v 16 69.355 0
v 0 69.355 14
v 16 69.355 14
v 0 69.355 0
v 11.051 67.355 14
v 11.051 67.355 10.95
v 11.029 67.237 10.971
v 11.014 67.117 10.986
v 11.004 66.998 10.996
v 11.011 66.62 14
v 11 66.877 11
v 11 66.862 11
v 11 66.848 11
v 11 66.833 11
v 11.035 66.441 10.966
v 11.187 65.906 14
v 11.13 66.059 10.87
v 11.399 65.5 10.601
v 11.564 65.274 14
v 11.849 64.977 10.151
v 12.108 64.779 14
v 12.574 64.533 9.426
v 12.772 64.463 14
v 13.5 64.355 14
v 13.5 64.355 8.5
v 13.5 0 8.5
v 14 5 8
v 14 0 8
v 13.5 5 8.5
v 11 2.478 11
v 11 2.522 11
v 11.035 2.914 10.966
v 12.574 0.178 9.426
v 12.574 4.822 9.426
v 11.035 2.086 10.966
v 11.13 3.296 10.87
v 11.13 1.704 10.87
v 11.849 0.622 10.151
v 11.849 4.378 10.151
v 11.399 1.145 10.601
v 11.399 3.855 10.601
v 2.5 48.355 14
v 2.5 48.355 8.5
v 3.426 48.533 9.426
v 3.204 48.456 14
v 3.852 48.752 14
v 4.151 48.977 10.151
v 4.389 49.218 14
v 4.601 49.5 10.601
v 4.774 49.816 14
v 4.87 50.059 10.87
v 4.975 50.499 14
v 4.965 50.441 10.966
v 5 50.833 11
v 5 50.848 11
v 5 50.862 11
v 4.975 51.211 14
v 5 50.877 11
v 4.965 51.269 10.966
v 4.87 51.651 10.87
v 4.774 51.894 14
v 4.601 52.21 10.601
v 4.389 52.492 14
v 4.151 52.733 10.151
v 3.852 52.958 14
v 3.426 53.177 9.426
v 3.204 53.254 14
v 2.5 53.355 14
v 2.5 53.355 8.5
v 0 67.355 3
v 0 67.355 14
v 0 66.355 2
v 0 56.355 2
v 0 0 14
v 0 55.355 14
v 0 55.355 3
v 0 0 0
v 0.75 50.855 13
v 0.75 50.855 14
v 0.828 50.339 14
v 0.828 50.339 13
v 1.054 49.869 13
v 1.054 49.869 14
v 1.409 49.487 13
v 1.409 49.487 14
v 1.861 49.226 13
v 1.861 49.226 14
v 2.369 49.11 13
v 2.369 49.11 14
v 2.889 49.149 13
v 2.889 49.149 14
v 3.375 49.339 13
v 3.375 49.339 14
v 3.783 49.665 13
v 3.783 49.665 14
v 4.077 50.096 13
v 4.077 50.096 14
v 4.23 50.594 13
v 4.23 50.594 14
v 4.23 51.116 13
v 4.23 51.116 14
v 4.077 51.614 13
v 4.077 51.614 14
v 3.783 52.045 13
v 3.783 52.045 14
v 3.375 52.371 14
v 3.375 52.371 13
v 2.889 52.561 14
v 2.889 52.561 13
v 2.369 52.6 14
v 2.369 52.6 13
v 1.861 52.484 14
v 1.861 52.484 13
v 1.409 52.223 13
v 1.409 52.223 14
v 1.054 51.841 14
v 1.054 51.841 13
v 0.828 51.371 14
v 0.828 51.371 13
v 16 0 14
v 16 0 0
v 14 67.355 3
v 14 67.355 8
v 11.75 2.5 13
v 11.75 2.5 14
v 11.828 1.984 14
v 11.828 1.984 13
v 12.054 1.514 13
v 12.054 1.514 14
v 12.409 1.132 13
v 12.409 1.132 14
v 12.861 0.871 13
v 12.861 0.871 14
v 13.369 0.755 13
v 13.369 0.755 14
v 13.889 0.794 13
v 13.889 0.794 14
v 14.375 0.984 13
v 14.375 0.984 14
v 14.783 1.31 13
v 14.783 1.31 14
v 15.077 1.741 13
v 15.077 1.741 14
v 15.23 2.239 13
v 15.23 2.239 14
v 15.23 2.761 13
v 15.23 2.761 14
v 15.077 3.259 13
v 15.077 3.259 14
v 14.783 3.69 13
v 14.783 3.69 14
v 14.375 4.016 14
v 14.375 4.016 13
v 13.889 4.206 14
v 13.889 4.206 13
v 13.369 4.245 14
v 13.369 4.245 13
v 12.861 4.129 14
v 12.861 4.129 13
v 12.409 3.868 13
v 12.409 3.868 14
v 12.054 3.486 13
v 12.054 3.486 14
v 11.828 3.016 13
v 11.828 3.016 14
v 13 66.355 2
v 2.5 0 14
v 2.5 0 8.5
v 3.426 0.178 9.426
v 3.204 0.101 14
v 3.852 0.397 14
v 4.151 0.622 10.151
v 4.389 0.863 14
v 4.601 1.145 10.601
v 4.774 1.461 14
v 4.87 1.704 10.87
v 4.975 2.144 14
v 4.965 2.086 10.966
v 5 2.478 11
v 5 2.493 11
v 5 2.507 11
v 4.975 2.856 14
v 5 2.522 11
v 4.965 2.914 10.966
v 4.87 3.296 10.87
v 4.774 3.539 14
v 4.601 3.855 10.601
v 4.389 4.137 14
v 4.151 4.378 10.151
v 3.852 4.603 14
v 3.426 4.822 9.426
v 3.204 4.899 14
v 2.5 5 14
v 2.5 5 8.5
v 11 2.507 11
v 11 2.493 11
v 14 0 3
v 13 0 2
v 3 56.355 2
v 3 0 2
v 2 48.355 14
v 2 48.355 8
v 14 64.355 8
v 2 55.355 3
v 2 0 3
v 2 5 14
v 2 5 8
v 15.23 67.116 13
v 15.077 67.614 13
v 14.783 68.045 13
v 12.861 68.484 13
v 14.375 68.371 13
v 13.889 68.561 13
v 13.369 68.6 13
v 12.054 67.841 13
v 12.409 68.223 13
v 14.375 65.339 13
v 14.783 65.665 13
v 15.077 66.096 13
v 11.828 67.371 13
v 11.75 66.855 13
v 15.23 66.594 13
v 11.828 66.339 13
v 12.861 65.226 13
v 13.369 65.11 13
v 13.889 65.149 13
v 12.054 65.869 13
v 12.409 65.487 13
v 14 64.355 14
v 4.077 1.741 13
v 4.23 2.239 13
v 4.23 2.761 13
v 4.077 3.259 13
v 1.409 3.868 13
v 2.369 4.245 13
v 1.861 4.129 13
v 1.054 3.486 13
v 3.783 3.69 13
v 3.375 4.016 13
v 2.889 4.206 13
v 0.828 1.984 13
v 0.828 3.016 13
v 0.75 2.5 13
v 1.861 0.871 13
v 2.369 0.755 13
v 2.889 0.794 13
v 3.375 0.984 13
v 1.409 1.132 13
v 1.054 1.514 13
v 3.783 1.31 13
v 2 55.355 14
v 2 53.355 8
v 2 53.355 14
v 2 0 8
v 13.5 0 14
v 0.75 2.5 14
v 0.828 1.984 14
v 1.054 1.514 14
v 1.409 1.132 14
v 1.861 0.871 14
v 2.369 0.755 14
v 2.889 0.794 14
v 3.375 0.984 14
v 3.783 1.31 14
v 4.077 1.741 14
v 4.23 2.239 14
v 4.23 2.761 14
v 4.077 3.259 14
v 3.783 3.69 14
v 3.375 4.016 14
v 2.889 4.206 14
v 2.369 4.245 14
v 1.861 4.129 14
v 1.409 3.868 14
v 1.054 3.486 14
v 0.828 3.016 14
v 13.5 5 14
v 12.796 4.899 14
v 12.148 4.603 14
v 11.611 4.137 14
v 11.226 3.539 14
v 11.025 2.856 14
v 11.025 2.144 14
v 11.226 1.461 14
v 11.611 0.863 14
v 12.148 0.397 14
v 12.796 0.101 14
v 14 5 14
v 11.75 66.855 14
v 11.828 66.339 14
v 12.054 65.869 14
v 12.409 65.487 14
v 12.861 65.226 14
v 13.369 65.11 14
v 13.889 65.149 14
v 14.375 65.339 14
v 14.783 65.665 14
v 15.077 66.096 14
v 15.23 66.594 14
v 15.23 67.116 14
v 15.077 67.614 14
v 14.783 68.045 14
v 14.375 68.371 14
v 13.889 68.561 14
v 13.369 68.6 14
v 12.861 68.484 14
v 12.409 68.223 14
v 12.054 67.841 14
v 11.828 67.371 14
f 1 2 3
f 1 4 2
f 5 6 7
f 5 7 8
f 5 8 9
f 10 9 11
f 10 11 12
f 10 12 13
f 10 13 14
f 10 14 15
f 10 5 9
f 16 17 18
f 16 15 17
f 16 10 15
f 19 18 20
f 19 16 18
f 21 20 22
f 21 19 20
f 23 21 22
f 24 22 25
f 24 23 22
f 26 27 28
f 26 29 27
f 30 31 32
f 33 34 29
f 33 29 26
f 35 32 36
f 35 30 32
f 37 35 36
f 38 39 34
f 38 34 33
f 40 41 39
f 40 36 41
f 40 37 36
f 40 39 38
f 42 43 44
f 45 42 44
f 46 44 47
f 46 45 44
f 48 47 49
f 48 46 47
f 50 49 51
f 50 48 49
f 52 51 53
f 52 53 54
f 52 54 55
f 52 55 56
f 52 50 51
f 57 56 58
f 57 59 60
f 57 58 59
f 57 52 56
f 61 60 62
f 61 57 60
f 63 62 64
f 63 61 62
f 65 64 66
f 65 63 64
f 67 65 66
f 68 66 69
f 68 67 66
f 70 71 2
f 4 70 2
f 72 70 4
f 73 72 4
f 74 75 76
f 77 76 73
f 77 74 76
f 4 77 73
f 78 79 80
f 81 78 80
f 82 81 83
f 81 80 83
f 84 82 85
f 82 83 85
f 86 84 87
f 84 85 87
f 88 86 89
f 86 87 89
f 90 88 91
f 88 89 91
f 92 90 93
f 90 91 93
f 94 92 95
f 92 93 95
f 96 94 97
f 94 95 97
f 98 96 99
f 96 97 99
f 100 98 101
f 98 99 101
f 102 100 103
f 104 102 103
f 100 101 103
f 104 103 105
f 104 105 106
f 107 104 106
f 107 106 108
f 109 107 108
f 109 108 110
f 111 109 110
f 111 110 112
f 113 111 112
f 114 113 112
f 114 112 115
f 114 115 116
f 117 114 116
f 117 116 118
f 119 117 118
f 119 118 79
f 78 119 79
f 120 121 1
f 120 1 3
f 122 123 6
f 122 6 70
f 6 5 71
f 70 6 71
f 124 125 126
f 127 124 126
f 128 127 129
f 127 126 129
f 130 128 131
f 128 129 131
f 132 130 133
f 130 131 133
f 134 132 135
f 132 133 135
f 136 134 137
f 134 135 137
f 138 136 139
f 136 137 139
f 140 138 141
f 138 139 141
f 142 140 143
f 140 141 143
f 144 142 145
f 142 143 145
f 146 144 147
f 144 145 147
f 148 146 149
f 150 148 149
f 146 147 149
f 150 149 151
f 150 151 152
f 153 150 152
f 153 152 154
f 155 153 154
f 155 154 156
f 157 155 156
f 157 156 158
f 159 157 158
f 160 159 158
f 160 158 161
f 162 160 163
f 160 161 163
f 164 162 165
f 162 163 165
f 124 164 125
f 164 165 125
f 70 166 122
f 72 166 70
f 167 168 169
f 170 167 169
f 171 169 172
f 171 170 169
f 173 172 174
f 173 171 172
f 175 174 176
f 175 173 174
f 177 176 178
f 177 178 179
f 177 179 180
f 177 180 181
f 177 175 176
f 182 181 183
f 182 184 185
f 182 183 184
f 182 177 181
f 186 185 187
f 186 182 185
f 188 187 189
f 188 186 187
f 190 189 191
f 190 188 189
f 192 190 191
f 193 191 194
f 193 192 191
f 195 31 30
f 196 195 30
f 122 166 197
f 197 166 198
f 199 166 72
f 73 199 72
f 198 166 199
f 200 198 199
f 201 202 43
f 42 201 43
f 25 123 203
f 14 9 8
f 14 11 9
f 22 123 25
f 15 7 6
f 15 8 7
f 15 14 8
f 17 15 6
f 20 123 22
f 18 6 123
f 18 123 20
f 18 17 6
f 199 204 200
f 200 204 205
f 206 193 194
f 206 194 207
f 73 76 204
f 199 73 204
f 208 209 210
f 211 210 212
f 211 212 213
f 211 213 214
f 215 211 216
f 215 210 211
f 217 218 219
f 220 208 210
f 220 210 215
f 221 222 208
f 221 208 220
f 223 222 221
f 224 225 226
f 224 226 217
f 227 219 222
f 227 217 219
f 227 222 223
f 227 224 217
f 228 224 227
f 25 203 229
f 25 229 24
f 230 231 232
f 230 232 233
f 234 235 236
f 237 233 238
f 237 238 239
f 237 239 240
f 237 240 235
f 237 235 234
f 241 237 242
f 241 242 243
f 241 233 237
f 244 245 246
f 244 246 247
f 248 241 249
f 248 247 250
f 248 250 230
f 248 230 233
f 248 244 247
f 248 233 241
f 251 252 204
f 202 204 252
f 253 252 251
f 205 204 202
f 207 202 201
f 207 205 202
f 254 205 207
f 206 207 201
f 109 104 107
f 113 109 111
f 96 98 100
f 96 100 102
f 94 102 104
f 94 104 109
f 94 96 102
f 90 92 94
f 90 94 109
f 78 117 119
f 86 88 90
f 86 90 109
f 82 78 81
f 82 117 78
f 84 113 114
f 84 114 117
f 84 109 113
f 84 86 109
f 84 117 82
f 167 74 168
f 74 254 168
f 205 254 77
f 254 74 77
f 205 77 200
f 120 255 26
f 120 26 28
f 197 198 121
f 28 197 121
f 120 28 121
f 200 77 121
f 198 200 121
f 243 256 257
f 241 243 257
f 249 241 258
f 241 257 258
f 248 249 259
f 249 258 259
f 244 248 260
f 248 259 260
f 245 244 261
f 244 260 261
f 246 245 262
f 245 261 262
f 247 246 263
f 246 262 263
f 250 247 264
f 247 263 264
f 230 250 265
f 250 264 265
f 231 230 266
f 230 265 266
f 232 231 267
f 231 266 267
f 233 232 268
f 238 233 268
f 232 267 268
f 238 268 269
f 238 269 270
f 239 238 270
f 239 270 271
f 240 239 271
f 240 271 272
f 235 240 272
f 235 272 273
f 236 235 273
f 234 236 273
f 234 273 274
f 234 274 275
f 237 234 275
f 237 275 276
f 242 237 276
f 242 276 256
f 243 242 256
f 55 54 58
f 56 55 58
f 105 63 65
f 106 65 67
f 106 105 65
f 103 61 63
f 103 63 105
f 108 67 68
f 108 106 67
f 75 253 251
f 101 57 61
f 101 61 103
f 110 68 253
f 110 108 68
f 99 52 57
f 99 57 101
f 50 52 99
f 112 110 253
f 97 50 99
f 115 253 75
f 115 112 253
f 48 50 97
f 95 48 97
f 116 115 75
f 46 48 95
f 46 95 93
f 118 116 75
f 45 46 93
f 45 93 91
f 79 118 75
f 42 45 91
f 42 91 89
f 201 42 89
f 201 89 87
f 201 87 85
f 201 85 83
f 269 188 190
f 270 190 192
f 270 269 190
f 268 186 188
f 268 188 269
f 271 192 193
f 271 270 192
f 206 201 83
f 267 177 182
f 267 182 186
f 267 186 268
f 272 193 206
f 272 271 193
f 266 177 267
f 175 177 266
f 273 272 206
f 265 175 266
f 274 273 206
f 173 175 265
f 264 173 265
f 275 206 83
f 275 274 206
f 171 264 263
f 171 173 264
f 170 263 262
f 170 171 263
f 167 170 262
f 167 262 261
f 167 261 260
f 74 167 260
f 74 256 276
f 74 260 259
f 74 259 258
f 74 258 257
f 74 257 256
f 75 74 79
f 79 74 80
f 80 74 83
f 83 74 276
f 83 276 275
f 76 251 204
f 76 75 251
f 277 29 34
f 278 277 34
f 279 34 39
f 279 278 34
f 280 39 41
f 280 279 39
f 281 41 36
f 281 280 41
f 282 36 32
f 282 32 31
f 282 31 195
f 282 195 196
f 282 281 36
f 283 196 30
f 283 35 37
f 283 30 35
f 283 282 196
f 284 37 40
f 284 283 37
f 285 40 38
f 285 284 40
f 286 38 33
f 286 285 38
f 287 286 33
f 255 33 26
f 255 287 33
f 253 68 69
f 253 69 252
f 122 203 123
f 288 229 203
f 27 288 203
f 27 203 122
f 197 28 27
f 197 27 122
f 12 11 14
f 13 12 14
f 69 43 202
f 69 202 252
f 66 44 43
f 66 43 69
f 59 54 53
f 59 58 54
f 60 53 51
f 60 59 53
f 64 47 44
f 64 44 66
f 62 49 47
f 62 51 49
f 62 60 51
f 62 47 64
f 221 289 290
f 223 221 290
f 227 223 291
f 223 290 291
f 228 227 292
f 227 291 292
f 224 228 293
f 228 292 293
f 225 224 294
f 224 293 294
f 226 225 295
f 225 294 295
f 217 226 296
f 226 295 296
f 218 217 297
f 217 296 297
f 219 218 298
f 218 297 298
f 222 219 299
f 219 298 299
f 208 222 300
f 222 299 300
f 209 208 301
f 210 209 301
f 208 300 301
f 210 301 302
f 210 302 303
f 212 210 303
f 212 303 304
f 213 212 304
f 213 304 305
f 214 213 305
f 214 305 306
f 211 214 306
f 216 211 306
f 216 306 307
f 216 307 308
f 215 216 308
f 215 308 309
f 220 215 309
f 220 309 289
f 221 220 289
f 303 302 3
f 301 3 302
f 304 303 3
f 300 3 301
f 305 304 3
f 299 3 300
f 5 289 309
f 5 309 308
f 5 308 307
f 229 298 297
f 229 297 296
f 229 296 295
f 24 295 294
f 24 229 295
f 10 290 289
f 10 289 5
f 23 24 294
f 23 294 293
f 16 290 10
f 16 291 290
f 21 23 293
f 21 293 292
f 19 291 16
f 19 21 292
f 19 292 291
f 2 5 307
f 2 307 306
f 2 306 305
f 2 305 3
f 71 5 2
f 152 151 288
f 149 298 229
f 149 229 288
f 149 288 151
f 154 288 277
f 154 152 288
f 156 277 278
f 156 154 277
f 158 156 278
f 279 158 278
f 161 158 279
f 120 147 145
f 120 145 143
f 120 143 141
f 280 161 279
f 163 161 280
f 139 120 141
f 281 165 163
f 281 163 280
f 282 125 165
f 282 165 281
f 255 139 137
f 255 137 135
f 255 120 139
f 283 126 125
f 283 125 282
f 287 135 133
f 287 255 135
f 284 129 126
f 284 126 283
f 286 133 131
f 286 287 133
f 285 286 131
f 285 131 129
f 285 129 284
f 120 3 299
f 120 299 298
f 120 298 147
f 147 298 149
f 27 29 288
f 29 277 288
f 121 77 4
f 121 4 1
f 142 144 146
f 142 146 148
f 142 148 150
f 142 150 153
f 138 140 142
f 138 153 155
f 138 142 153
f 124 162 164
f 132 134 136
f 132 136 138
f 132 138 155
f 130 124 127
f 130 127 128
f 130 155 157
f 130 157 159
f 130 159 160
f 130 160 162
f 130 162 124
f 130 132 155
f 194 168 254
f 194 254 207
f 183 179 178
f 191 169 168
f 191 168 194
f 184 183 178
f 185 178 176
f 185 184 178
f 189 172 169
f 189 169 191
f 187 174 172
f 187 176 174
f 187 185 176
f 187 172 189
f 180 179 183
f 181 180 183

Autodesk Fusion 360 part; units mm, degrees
sketch "3D-printed conduit outline" plane through (0, 0, 0) normal (0, 1, 0) x (1, 0, 0)
  line L0 (0, 0) -> (16, 0)
  line L1 (16, 0) -> (16, -14)
  line L2 (16, -14) -> (0, -14)
  line L3 (0, -14) -> (0, 0)
  line L4 (2, -14) -> (14, -14)
  line L5 (14, -14) -> (14, -2)
  line L6 (14, -2) -> (2, -2)
  line L7 (2, -2) -> (2, -14)
  dimension "d8" = 14
  dimension "d9" = 16
  dimension "d10" = 2
  dimension "d11" = 2
  dimension "d12" = 2
extrude "Extrude1" add sketch "3D-printed conduit outline" along normal blind 69.355 contours L0 L1 L2 L3 L5 L6 L7
sketch "Magnet holders" plane through (0, 0, 14) normal (0, 0, 1) x (-1, 0, 0)
  line L0 (0, 0) -> (-2, 0)
  line L1 (-2, 0) -> (-2, -69.355)
  line L2 (-2, -69.355) -> (0, -69.355)
  line L3 (0, -69.355) -> (0, 0)
  line L4 (-14, 0) -> (-16, 0)
  line L5 (-16, 0) -> (-16, -69.355)
  line L6 (-16, -69.355) -> (-14, -69.355)
  line L7 (-14, -69.355) -> (-14, 0)
  circle A0 centre (-2.5, -2.5) radius 2.5
  circle A1 centre (-2.5, -2.5) radius 1.75
  line L8 (-14, 0) -> (-2, 0)
  line L9 (0, 0) -> (-2.5, 0)
  line L10 (-2.5, 0) -> (-2.5, -5)
  line L11 (-2.5, -5) -> (0, -5)
  line L12 (0, -5) -> (0, 0)
  circle A2 centre (-13.5, -2.5) radius 2.5
  circle A3 centre (-13.5, -2.5) radius 1.75
  line L13 (-16, 0) -> (-13.5, 0)
  line L14 (-13.5, 0) -> (-13.5, -5)
  line L15 (-13.5, -5) -> (-16, -5)
  line L16 (-16, -5) -> (-16, 0)
  circle A4 centre (-2.5, -50.855) radius 1.75
  circle A5 centre (-2.5, -50.855) radius 2.5
  line L17 (-2.5, -48.355) -> (-2.5, -53.355)
  line L18 (-2.5, -53.355) -> (0, -53.355)
  line L19 (0, -53.355) -> (0, -48.355)
  line L20 (0, -48.355) -> (-2.5, -48.355)
  circle A6 centre (-13.5, -66.855) radius 2.5
  circle A7 centre (-13.5, -66.855) radius 1.75
  line L21 (-13.5, -64.355) -> (-13.5, -69.355)
  line L22 (-13.5, -69.355) -> (-16, -69.355)
  line L23 (-16, -69.355) -> (-16, -64.355)
  line L24 (-16, -64.355) -> (-13.5, -64.355)
  dimension "d15" = 5
  dimension "d16" = 3.5
  dimension "d17" = 5
  dimension "d18" = 3.5
  dimension "d21" = 0
  dimension "d22" = -48.355
  dimension "d42" = 0
  dimension "d43" = -64.355
sketch "End wall" plane through (0, 69.355, 0) normal (0, 1, 0) x (-1, 0, 0)
  line L0 (-2, 2) -> (-14, 2)
  line L1 (-14, 2) -> (-14, 14)
  line L2 (-14, 14) -> (-16, 14)
  line L3 (-16, 14) -> (-16, 0)
  line L4 (-16, 0) -> (0, 0)
  line L5 (0, 0) -> (0, 14)
  line L6 (0, 14) -> (-2, 14)
  line L7 (-2, 14) -> (-2, 2)
  line L8 (-16, 0) -> (0, 0)
  line L9 (0, 0) -> (0, 14)
  line L10 (0, 14) -> (-16, 14)
  line L11 (-16, 14) -> (-16, 0)
extrude "Extrude8" add sketch "End wall" against normal blind 2
extrude "Extrude2" add sketch "Magnet holders" against normal blind 3 contours A2 A3 L14 | L7 A2 A3 L14 | L7 L8 A2 L13 | L1 A0 L8 L9 | L1 A0 A1 L10 | A0 A1 L10 | L1 A0 A1 L10 | L1 A0 L11 | L1 A1 L10 | A1 L10 | L7 A3 L14 | A3 L14 | L1 A5 L20 | L7 A2 L15 | L7 A2 A3 L14 | L1 A4 A5 L17 | L1 A4 A5 L17 | L1 A5 L18 | A4 A5 L17 | L1 A4 L17 | A4 L17 | L7 A6 L24 | L7 A6 A7 L21 | A6 A7 L21 | L7 A7 L21 | A7 L21 | L7 A6 L22 | L7 A6 A7 L21
extrude "Extrude4" cut sketch "Magnet holders" against normal blind 1 contours L1 A1 | L1 A1 L10 | A1 L10 | L7 A3 L14 | A3 L14 | L7 A3 | L1 A4 | L1 A4 L17 | A4 L17 | L7 A7 L21 | L7 A7 | A7 L21
chamfer "Chamfer2" distance 2.9999 angle 45 5 edges at (2, 2.5, 11) (2, 50.855, 11) (2, 2.5, 11) (14, 2.5, 11) (14, 65.855, 11)
sketch "Smartie hopper mechanism conduit 2 outlet" plane through (0, 0, 0) normal (-1, 0, 0) x (0, -1, 0)
  line L0 (-69.355, 0) -> (0, 0)
  line L1 (0, 0) -> (0, 14)
  line L2 (0, 14) -> (-69.355, 14)
  line L3 (-69.355, 14) -> (-69.355, 0)
  line L4 (-67.355, 14) -> (-55.355, 14)
  line L5 (-55.355, 14) -> (-55.355, 2)
  line L6 (-55.355, 2) -> (-67.355, 2)
  line L7 (-67.355, 2) -> (-67.355, 14)
  dimension "d60" = 2
  dimension "d61" = 12
  dimension "d62" = 2
extrude "Extrude11" cut sketch "Smartie hopper mechanism conduit 2 outlet" against normal blind 2 contours L2 L4 L5 L6 L7
chamfer "Chamfer5" distance 1 angle 45 4 edges at (2, 27.6775, 2) (1, 55.355, 2) (7, 67.355, 2) (14, 33.6775, 2)
equation "conduit_length = 69.355 mm"
equation "conduit_width = 16 mm"
equation "conduit_height = 16 mm"
equation "conduit_wall_thickness = 2 mm"
equation "magnet_diameter = 3 mm"
equation "magnet_height = 1 mm"
equation "d8 = conduit_height - conduit_wall_thickness"
equation "d9 = conduit_width"
equation "d10 = conduit_wall_thickness"
equation "d11 = conduit_wall_thickness"
equation "d12 = conduit_wall_thickness"
equation "d13 = conduit_length"
equation "d15 = magnet_diameter + 2 mm"
equation "d16 = magnet_diameter + 0.5 mm"
equation "d17 = magnet_diameter + 2 mm"
equation "d18 = magnet_diameter + 0.5 mm"
equation "d22 = -conduit_length + ( magnet_diameter + 2 mm ) + ( conduit_width )"
equation "d23 = -( magnet_height + 2 mm )"
equation "d43 = -conduit_length + ( magnet_diameter + 2 mm )"
equation "d60 = conduit_wall_thickness"
equation "d62 = conduit_wall_thickness"
